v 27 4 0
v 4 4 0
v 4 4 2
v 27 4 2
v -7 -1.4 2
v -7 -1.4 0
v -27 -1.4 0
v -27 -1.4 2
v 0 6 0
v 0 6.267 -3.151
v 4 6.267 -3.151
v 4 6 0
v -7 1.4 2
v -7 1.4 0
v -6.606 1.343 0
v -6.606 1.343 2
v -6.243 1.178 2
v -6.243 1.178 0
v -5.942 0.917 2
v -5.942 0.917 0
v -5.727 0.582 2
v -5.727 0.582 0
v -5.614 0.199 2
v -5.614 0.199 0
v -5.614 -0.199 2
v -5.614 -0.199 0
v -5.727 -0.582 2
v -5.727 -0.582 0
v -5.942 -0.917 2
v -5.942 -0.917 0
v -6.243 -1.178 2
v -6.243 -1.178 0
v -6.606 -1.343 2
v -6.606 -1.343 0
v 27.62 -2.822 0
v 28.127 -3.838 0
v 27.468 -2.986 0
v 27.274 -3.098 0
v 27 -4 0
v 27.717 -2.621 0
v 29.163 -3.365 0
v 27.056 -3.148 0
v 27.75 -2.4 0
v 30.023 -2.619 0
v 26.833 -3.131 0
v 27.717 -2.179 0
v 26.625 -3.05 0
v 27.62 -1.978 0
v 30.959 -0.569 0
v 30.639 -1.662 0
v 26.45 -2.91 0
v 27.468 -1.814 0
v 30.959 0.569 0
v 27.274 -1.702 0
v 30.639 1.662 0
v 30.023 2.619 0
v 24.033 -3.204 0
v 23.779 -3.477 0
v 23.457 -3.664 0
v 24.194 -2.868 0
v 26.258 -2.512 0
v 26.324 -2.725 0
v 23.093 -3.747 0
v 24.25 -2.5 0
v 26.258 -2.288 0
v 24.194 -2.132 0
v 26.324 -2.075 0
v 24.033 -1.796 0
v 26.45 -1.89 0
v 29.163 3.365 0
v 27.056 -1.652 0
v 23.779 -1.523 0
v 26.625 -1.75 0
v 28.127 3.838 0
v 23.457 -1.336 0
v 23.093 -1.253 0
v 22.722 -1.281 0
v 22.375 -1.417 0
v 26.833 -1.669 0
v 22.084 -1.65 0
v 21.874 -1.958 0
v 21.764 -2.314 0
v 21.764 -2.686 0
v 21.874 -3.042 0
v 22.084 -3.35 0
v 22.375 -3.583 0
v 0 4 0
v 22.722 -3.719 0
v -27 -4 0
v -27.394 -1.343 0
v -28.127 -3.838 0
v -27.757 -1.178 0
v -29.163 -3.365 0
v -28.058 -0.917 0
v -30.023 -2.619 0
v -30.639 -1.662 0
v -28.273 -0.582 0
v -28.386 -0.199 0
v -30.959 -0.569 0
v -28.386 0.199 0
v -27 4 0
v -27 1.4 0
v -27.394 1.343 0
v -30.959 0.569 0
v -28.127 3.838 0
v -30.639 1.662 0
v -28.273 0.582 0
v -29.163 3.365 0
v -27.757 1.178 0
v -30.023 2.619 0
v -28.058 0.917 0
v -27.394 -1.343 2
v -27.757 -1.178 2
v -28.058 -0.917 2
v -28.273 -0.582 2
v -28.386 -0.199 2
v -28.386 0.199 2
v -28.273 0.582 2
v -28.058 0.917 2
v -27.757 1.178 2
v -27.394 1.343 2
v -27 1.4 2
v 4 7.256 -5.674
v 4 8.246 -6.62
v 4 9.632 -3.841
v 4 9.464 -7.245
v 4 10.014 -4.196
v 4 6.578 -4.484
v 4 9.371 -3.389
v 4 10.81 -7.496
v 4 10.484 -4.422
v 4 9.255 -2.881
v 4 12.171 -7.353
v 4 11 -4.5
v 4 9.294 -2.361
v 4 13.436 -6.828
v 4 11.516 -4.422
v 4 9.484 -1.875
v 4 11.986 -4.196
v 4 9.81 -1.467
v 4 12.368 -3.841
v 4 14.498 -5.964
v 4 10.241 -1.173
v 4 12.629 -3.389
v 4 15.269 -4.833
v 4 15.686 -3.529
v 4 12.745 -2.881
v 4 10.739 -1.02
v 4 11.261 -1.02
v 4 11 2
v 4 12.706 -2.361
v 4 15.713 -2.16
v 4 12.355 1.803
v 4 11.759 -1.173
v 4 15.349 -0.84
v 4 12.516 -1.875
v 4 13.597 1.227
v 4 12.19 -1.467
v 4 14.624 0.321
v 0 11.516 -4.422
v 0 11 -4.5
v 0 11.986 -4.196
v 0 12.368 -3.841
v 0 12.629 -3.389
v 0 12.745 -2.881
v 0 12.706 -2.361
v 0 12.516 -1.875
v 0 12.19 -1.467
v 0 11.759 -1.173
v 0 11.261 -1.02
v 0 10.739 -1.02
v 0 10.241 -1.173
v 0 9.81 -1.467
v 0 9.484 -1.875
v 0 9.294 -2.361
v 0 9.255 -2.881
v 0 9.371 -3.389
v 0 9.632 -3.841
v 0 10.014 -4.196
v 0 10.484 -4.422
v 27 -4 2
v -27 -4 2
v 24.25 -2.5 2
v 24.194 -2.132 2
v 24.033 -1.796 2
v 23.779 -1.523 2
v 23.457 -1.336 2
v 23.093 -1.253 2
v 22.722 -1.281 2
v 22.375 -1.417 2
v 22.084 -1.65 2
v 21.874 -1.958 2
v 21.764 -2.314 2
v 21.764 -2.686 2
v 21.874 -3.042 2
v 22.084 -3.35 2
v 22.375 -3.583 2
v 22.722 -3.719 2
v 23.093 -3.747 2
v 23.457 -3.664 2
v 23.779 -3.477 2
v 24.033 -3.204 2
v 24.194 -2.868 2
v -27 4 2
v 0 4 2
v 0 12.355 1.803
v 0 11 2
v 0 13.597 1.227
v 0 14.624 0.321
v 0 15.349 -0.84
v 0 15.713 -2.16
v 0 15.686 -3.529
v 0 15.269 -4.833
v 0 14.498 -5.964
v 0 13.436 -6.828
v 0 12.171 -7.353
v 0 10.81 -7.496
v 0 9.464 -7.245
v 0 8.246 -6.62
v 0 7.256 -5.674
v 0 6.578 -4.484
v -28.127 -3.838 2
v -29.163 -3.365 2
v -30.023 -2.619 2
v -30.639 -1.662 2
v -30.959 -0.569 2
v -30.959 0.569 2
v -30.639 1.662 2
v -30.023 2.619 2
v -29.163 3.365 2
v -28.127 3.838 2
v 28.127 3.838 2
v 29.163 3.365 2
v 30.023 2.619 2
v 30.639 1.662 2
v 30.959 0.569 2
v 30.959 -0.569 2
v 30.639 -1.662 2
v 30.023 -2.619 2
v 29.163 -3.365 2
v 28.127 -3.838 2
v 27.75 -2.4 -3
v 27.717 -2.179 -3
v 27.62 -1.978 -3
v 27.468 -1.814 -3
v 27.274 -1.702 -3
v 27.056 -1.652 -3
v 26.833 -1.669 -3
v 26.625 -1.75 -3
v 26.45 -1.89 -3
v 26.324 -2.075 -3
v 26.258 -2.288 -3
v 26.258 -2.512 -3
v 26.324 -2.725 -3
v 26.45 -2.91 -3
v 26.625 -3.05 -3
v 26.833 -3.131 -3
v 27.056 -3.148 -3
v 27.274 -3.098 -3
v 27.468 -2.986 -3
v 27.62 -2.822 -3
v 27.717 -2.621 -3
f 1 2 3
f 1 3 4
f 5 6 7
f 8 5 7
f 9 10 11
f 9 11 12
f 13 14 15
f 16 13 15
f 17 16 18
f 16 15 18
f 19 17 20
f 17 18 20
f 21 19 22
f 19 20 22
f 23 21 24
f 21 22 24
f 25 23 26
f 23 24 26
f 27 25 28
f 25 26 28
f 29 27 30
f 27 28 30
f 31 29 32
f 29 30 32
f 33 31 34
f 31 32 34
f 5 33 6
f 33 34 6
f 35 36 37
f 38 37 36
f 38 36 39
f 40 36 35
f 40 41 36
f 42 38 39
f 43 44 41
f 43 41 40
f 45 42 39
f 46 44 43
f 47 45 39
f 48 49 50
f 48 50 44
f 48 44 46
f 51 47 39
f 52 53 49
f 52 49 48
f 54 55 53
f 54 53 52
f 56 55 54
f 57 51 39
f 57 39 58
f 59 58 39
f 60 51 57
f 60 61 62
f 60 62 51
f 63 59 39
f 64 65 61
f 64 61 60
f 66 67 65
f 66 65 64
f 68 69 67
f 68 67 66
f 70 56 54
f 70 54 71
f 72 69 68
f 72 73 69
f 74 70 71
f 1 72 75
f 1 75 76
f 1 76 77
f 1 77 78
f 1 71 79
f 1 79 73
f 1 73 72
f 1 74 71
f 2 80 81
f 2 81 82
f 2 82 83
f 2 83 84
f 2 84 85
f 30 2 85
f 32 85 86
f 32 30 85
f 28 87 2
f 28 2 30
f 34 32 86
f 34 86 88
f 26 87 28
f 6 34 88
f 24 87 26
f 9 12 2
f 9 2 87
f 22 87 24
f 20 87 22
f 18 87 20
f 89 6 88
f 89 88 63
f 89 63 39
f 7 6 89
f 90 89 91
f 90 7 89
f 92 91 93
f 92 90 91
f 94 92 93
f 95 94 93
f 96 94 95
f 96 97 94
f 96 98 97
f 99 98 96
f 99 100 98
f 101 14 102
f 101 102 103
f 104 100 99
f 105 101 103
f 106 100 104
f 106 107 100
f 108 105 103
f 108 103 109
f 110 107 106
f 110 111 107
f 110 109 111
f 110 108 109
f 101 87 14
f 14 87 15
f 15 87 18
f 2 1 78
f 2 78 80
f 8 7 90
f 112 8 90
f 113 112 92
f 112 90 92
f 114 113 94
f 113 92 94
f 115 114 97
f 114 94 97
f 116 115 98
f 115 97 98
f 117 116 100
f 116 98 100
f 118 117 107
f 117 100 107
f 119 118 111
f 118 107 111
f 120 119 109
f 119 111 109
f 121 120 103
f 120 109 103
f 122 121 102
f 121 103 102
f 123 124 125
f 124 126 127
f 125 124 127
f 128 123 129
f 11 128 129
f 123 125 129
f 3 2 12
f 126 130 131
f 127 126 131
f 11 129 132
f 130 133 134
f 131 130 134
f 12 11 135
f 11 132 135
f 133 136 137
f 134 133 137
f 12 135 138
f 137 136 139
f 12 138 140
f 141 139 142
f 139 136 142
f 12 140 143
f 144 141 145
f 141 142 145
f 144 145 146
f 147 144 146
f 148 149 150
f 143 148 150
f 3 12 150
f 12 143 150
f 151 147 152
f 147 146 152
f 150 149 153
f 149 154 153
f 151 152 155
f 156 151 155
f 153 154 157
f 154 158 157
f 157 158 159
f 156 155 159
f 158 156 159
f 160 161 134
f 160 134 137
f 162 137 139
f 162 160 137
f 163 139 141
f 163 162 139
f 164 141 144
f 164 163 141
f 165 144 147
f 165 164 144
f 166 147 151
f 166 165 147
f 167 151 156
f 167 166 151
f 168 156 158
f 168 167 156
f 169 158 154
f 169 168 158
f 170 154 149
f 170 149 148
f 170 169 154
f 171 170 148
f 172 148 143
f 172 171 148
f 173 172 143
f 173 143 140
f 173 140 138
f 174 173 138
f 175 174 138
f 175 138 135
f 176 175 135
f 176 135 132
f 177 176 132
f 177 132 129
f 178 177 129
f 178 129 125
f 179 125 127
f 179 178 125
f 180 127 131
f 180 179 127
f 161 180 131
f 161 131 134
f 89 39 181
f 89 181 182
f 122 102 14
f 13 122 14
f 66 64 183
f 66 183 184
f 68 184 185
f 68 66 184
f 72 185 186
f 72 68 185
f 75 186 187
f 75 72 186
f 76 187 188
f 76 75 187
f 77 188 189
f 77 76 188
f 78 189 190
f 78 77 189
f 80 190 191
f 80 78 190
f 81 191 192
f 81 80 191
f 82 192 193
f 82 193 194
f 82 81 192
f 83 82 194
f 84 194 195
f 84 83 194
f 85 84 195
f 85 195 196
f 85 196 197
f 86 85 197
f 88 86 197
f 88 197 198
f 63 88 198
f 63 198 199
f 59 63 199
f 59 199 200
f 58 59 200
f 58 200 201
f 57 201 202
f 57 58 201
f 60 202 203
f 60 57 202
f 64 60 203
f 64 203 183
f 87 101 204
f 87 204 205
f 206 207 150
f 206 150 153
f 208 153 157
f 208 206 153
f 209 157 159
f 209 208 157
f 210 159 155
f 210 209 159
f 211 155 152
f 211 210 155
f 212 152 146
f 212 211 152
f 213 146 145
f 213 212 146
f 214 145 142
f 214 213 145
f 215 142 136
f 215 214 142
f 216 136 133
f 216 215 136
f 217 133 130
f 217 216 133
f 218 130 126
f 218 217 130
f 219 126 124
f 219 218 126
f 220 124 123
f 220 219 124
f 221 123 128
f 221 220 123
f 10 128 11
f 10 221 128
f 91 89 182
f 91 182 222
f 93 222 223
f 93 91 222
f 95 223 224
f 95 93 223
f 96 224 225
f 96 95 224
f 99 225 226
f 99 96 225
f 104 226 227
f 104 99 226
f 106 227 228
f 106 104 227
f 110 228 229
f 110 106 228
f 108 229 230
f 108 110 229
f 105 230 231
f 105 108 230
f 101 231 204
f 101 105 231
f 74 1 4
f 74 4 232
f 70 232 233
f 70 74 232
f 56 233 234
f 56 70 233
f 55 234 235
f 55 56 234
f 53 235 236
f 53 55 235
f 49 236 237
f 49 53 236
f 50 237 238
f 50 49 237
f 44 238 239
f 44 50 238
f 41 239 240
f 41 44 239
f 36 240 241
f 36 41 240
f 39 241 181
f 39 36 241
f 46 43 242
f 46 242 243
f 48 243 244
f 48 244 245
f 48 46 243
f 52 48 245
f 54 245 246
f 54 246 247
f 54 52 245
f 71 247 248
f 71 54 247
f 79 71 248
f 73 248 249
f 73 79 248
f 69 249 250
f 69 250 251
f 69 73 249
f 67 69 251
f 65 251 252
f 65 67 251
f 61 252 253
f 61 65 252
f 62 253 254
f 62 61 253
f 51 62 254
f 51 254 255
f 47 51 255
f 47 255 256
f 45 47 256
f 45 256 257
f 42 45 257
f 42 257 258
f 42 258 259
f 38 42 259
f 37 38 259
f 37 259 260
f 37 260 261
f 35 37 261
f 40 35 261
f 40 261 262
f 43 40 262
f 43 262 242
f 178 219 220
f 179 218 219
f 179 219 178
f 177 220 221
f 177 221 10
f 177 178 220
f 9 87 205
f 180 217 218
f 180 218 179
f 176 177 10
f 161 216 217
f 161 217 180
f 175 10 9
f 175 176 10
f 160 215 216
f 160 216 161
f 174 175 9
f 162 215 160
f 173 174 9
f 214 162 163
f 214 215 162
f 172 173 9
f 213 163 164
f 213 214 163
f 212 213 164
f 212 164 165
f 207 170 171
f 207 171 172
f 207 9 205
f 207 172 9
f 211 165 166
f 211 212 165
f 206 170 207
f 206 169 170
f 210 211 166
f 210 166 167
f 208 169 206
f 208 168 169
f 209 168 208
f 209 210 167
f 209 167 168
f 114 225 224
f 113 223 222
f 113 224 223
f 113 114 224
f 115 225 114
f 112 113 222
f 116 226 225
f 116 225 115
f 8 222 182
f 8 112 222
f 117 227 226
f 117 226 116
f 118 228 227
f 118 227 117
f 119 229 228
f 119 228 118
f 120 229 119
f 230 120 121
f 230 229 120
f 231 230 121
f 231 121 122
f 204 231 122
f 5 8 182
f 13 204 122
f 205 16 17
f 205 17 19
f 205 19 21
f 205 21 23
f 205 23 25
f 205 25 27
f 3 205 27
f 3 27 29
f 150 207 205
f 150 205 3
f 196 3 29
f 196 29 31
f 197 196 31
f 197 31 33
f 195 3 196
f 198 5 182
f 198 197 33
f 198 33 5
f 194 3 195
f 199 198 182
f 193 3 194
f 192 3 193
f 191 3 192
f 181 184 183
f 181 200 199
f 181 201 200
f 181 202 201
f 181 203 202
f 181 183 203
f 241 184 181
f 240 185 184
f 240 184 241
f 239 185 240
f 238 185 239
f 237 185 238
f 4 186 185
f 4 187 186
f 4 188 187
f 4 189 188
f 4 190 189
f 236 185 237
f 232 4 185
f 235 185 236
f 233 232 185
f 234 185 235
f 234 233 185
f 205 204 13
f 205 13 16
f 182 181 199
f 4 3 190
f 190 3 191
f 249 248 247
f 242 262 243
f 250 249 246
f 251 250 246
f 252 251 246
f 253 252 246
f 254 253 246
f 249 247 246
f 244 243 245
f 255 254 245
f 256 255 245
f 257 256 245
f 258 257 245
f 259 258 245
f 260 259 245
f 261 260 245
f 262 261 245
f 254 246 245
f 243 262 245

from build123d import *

# Parameters (mm, degrees)
ESBO_O1_R                = 1.25
RESSALTO_EXTRUS_O1_DEPTH = 2
ESBO_O2_R                = 0.75
RESSALTO_EXTRUS_O2_DEPTH = 5
ESBO_O3_R                = 1.75
RESSALTO_EXTRUS_O3_DEPTH = 4


with BuildPart() as part:
    # Esboço1 → Ressalto-extrusão1 (new body)
    with BuildSketch(Plane.XY):
        with BuildLine():
            Line((-27, 4), (27, 4))
            ThreePointArc((27, 4), (31, 0), (27, -4))
            Line((27, -4), (-27, -4))
            ThreePointArc((-27, -4), (-31, 0), (-27, 4))
        make_face()
        with Locations((23, -2.5)):
            Circle(ESBO_O1_R, mode=Mode.SUBTRACT)
        with BuildLine():
            Line((-27, 1.4), (-7, 1.4))
            ThreePointArc((-7, 1.4), (-5.6, 0), (-7, -1.4))
            Line((-7, -1.4), (-27, -1.4))
            ThreePointArc((-27, -1.4), (-28.4, 0), (-27, 1.4))
        make_face(mode=Mode.SUBTRACT)
    extrude(amount=RESSALTO_EXTRUS_O1_DEPTH)

    # Esboço2 → Ressalto-extrusão2 (add)
    with BuildSketch(Plane.XY.offset(2)):
        with Locations((27, -2.4)):
            Circle(ESBO_O2_R)
    extrude(amount=-RESSALTO_EXTRUS_O2_DEPTH)

    # Esboço3 → Ressalto-extrusão3 (add)
    with BuildSketch(Plane(origin=(0, 0, 0), x_dir=(0, 0, -1), z_dir=(1, 0, 0))):
        with BuildLine():
            Line((-2, 4), (-2, 11))
            ThreePointArc((-2, 11), (5.96386061, 14.497656355), (3.150989464, 6.266955795))
            Line((3.150989464, 6.266955795), (0, 6))
            Line((0, 6), (0, 4))
            Line((0, 4), (-2, 4))
        make_face()
        with Locations((2.75, 11)):
            Circle(ESBO_O3_R, mode=Mode.SUBTRACT)
    extrude(amount=RESSALTO_EXTRUS_O3_DEPTH)


solid = part.part
